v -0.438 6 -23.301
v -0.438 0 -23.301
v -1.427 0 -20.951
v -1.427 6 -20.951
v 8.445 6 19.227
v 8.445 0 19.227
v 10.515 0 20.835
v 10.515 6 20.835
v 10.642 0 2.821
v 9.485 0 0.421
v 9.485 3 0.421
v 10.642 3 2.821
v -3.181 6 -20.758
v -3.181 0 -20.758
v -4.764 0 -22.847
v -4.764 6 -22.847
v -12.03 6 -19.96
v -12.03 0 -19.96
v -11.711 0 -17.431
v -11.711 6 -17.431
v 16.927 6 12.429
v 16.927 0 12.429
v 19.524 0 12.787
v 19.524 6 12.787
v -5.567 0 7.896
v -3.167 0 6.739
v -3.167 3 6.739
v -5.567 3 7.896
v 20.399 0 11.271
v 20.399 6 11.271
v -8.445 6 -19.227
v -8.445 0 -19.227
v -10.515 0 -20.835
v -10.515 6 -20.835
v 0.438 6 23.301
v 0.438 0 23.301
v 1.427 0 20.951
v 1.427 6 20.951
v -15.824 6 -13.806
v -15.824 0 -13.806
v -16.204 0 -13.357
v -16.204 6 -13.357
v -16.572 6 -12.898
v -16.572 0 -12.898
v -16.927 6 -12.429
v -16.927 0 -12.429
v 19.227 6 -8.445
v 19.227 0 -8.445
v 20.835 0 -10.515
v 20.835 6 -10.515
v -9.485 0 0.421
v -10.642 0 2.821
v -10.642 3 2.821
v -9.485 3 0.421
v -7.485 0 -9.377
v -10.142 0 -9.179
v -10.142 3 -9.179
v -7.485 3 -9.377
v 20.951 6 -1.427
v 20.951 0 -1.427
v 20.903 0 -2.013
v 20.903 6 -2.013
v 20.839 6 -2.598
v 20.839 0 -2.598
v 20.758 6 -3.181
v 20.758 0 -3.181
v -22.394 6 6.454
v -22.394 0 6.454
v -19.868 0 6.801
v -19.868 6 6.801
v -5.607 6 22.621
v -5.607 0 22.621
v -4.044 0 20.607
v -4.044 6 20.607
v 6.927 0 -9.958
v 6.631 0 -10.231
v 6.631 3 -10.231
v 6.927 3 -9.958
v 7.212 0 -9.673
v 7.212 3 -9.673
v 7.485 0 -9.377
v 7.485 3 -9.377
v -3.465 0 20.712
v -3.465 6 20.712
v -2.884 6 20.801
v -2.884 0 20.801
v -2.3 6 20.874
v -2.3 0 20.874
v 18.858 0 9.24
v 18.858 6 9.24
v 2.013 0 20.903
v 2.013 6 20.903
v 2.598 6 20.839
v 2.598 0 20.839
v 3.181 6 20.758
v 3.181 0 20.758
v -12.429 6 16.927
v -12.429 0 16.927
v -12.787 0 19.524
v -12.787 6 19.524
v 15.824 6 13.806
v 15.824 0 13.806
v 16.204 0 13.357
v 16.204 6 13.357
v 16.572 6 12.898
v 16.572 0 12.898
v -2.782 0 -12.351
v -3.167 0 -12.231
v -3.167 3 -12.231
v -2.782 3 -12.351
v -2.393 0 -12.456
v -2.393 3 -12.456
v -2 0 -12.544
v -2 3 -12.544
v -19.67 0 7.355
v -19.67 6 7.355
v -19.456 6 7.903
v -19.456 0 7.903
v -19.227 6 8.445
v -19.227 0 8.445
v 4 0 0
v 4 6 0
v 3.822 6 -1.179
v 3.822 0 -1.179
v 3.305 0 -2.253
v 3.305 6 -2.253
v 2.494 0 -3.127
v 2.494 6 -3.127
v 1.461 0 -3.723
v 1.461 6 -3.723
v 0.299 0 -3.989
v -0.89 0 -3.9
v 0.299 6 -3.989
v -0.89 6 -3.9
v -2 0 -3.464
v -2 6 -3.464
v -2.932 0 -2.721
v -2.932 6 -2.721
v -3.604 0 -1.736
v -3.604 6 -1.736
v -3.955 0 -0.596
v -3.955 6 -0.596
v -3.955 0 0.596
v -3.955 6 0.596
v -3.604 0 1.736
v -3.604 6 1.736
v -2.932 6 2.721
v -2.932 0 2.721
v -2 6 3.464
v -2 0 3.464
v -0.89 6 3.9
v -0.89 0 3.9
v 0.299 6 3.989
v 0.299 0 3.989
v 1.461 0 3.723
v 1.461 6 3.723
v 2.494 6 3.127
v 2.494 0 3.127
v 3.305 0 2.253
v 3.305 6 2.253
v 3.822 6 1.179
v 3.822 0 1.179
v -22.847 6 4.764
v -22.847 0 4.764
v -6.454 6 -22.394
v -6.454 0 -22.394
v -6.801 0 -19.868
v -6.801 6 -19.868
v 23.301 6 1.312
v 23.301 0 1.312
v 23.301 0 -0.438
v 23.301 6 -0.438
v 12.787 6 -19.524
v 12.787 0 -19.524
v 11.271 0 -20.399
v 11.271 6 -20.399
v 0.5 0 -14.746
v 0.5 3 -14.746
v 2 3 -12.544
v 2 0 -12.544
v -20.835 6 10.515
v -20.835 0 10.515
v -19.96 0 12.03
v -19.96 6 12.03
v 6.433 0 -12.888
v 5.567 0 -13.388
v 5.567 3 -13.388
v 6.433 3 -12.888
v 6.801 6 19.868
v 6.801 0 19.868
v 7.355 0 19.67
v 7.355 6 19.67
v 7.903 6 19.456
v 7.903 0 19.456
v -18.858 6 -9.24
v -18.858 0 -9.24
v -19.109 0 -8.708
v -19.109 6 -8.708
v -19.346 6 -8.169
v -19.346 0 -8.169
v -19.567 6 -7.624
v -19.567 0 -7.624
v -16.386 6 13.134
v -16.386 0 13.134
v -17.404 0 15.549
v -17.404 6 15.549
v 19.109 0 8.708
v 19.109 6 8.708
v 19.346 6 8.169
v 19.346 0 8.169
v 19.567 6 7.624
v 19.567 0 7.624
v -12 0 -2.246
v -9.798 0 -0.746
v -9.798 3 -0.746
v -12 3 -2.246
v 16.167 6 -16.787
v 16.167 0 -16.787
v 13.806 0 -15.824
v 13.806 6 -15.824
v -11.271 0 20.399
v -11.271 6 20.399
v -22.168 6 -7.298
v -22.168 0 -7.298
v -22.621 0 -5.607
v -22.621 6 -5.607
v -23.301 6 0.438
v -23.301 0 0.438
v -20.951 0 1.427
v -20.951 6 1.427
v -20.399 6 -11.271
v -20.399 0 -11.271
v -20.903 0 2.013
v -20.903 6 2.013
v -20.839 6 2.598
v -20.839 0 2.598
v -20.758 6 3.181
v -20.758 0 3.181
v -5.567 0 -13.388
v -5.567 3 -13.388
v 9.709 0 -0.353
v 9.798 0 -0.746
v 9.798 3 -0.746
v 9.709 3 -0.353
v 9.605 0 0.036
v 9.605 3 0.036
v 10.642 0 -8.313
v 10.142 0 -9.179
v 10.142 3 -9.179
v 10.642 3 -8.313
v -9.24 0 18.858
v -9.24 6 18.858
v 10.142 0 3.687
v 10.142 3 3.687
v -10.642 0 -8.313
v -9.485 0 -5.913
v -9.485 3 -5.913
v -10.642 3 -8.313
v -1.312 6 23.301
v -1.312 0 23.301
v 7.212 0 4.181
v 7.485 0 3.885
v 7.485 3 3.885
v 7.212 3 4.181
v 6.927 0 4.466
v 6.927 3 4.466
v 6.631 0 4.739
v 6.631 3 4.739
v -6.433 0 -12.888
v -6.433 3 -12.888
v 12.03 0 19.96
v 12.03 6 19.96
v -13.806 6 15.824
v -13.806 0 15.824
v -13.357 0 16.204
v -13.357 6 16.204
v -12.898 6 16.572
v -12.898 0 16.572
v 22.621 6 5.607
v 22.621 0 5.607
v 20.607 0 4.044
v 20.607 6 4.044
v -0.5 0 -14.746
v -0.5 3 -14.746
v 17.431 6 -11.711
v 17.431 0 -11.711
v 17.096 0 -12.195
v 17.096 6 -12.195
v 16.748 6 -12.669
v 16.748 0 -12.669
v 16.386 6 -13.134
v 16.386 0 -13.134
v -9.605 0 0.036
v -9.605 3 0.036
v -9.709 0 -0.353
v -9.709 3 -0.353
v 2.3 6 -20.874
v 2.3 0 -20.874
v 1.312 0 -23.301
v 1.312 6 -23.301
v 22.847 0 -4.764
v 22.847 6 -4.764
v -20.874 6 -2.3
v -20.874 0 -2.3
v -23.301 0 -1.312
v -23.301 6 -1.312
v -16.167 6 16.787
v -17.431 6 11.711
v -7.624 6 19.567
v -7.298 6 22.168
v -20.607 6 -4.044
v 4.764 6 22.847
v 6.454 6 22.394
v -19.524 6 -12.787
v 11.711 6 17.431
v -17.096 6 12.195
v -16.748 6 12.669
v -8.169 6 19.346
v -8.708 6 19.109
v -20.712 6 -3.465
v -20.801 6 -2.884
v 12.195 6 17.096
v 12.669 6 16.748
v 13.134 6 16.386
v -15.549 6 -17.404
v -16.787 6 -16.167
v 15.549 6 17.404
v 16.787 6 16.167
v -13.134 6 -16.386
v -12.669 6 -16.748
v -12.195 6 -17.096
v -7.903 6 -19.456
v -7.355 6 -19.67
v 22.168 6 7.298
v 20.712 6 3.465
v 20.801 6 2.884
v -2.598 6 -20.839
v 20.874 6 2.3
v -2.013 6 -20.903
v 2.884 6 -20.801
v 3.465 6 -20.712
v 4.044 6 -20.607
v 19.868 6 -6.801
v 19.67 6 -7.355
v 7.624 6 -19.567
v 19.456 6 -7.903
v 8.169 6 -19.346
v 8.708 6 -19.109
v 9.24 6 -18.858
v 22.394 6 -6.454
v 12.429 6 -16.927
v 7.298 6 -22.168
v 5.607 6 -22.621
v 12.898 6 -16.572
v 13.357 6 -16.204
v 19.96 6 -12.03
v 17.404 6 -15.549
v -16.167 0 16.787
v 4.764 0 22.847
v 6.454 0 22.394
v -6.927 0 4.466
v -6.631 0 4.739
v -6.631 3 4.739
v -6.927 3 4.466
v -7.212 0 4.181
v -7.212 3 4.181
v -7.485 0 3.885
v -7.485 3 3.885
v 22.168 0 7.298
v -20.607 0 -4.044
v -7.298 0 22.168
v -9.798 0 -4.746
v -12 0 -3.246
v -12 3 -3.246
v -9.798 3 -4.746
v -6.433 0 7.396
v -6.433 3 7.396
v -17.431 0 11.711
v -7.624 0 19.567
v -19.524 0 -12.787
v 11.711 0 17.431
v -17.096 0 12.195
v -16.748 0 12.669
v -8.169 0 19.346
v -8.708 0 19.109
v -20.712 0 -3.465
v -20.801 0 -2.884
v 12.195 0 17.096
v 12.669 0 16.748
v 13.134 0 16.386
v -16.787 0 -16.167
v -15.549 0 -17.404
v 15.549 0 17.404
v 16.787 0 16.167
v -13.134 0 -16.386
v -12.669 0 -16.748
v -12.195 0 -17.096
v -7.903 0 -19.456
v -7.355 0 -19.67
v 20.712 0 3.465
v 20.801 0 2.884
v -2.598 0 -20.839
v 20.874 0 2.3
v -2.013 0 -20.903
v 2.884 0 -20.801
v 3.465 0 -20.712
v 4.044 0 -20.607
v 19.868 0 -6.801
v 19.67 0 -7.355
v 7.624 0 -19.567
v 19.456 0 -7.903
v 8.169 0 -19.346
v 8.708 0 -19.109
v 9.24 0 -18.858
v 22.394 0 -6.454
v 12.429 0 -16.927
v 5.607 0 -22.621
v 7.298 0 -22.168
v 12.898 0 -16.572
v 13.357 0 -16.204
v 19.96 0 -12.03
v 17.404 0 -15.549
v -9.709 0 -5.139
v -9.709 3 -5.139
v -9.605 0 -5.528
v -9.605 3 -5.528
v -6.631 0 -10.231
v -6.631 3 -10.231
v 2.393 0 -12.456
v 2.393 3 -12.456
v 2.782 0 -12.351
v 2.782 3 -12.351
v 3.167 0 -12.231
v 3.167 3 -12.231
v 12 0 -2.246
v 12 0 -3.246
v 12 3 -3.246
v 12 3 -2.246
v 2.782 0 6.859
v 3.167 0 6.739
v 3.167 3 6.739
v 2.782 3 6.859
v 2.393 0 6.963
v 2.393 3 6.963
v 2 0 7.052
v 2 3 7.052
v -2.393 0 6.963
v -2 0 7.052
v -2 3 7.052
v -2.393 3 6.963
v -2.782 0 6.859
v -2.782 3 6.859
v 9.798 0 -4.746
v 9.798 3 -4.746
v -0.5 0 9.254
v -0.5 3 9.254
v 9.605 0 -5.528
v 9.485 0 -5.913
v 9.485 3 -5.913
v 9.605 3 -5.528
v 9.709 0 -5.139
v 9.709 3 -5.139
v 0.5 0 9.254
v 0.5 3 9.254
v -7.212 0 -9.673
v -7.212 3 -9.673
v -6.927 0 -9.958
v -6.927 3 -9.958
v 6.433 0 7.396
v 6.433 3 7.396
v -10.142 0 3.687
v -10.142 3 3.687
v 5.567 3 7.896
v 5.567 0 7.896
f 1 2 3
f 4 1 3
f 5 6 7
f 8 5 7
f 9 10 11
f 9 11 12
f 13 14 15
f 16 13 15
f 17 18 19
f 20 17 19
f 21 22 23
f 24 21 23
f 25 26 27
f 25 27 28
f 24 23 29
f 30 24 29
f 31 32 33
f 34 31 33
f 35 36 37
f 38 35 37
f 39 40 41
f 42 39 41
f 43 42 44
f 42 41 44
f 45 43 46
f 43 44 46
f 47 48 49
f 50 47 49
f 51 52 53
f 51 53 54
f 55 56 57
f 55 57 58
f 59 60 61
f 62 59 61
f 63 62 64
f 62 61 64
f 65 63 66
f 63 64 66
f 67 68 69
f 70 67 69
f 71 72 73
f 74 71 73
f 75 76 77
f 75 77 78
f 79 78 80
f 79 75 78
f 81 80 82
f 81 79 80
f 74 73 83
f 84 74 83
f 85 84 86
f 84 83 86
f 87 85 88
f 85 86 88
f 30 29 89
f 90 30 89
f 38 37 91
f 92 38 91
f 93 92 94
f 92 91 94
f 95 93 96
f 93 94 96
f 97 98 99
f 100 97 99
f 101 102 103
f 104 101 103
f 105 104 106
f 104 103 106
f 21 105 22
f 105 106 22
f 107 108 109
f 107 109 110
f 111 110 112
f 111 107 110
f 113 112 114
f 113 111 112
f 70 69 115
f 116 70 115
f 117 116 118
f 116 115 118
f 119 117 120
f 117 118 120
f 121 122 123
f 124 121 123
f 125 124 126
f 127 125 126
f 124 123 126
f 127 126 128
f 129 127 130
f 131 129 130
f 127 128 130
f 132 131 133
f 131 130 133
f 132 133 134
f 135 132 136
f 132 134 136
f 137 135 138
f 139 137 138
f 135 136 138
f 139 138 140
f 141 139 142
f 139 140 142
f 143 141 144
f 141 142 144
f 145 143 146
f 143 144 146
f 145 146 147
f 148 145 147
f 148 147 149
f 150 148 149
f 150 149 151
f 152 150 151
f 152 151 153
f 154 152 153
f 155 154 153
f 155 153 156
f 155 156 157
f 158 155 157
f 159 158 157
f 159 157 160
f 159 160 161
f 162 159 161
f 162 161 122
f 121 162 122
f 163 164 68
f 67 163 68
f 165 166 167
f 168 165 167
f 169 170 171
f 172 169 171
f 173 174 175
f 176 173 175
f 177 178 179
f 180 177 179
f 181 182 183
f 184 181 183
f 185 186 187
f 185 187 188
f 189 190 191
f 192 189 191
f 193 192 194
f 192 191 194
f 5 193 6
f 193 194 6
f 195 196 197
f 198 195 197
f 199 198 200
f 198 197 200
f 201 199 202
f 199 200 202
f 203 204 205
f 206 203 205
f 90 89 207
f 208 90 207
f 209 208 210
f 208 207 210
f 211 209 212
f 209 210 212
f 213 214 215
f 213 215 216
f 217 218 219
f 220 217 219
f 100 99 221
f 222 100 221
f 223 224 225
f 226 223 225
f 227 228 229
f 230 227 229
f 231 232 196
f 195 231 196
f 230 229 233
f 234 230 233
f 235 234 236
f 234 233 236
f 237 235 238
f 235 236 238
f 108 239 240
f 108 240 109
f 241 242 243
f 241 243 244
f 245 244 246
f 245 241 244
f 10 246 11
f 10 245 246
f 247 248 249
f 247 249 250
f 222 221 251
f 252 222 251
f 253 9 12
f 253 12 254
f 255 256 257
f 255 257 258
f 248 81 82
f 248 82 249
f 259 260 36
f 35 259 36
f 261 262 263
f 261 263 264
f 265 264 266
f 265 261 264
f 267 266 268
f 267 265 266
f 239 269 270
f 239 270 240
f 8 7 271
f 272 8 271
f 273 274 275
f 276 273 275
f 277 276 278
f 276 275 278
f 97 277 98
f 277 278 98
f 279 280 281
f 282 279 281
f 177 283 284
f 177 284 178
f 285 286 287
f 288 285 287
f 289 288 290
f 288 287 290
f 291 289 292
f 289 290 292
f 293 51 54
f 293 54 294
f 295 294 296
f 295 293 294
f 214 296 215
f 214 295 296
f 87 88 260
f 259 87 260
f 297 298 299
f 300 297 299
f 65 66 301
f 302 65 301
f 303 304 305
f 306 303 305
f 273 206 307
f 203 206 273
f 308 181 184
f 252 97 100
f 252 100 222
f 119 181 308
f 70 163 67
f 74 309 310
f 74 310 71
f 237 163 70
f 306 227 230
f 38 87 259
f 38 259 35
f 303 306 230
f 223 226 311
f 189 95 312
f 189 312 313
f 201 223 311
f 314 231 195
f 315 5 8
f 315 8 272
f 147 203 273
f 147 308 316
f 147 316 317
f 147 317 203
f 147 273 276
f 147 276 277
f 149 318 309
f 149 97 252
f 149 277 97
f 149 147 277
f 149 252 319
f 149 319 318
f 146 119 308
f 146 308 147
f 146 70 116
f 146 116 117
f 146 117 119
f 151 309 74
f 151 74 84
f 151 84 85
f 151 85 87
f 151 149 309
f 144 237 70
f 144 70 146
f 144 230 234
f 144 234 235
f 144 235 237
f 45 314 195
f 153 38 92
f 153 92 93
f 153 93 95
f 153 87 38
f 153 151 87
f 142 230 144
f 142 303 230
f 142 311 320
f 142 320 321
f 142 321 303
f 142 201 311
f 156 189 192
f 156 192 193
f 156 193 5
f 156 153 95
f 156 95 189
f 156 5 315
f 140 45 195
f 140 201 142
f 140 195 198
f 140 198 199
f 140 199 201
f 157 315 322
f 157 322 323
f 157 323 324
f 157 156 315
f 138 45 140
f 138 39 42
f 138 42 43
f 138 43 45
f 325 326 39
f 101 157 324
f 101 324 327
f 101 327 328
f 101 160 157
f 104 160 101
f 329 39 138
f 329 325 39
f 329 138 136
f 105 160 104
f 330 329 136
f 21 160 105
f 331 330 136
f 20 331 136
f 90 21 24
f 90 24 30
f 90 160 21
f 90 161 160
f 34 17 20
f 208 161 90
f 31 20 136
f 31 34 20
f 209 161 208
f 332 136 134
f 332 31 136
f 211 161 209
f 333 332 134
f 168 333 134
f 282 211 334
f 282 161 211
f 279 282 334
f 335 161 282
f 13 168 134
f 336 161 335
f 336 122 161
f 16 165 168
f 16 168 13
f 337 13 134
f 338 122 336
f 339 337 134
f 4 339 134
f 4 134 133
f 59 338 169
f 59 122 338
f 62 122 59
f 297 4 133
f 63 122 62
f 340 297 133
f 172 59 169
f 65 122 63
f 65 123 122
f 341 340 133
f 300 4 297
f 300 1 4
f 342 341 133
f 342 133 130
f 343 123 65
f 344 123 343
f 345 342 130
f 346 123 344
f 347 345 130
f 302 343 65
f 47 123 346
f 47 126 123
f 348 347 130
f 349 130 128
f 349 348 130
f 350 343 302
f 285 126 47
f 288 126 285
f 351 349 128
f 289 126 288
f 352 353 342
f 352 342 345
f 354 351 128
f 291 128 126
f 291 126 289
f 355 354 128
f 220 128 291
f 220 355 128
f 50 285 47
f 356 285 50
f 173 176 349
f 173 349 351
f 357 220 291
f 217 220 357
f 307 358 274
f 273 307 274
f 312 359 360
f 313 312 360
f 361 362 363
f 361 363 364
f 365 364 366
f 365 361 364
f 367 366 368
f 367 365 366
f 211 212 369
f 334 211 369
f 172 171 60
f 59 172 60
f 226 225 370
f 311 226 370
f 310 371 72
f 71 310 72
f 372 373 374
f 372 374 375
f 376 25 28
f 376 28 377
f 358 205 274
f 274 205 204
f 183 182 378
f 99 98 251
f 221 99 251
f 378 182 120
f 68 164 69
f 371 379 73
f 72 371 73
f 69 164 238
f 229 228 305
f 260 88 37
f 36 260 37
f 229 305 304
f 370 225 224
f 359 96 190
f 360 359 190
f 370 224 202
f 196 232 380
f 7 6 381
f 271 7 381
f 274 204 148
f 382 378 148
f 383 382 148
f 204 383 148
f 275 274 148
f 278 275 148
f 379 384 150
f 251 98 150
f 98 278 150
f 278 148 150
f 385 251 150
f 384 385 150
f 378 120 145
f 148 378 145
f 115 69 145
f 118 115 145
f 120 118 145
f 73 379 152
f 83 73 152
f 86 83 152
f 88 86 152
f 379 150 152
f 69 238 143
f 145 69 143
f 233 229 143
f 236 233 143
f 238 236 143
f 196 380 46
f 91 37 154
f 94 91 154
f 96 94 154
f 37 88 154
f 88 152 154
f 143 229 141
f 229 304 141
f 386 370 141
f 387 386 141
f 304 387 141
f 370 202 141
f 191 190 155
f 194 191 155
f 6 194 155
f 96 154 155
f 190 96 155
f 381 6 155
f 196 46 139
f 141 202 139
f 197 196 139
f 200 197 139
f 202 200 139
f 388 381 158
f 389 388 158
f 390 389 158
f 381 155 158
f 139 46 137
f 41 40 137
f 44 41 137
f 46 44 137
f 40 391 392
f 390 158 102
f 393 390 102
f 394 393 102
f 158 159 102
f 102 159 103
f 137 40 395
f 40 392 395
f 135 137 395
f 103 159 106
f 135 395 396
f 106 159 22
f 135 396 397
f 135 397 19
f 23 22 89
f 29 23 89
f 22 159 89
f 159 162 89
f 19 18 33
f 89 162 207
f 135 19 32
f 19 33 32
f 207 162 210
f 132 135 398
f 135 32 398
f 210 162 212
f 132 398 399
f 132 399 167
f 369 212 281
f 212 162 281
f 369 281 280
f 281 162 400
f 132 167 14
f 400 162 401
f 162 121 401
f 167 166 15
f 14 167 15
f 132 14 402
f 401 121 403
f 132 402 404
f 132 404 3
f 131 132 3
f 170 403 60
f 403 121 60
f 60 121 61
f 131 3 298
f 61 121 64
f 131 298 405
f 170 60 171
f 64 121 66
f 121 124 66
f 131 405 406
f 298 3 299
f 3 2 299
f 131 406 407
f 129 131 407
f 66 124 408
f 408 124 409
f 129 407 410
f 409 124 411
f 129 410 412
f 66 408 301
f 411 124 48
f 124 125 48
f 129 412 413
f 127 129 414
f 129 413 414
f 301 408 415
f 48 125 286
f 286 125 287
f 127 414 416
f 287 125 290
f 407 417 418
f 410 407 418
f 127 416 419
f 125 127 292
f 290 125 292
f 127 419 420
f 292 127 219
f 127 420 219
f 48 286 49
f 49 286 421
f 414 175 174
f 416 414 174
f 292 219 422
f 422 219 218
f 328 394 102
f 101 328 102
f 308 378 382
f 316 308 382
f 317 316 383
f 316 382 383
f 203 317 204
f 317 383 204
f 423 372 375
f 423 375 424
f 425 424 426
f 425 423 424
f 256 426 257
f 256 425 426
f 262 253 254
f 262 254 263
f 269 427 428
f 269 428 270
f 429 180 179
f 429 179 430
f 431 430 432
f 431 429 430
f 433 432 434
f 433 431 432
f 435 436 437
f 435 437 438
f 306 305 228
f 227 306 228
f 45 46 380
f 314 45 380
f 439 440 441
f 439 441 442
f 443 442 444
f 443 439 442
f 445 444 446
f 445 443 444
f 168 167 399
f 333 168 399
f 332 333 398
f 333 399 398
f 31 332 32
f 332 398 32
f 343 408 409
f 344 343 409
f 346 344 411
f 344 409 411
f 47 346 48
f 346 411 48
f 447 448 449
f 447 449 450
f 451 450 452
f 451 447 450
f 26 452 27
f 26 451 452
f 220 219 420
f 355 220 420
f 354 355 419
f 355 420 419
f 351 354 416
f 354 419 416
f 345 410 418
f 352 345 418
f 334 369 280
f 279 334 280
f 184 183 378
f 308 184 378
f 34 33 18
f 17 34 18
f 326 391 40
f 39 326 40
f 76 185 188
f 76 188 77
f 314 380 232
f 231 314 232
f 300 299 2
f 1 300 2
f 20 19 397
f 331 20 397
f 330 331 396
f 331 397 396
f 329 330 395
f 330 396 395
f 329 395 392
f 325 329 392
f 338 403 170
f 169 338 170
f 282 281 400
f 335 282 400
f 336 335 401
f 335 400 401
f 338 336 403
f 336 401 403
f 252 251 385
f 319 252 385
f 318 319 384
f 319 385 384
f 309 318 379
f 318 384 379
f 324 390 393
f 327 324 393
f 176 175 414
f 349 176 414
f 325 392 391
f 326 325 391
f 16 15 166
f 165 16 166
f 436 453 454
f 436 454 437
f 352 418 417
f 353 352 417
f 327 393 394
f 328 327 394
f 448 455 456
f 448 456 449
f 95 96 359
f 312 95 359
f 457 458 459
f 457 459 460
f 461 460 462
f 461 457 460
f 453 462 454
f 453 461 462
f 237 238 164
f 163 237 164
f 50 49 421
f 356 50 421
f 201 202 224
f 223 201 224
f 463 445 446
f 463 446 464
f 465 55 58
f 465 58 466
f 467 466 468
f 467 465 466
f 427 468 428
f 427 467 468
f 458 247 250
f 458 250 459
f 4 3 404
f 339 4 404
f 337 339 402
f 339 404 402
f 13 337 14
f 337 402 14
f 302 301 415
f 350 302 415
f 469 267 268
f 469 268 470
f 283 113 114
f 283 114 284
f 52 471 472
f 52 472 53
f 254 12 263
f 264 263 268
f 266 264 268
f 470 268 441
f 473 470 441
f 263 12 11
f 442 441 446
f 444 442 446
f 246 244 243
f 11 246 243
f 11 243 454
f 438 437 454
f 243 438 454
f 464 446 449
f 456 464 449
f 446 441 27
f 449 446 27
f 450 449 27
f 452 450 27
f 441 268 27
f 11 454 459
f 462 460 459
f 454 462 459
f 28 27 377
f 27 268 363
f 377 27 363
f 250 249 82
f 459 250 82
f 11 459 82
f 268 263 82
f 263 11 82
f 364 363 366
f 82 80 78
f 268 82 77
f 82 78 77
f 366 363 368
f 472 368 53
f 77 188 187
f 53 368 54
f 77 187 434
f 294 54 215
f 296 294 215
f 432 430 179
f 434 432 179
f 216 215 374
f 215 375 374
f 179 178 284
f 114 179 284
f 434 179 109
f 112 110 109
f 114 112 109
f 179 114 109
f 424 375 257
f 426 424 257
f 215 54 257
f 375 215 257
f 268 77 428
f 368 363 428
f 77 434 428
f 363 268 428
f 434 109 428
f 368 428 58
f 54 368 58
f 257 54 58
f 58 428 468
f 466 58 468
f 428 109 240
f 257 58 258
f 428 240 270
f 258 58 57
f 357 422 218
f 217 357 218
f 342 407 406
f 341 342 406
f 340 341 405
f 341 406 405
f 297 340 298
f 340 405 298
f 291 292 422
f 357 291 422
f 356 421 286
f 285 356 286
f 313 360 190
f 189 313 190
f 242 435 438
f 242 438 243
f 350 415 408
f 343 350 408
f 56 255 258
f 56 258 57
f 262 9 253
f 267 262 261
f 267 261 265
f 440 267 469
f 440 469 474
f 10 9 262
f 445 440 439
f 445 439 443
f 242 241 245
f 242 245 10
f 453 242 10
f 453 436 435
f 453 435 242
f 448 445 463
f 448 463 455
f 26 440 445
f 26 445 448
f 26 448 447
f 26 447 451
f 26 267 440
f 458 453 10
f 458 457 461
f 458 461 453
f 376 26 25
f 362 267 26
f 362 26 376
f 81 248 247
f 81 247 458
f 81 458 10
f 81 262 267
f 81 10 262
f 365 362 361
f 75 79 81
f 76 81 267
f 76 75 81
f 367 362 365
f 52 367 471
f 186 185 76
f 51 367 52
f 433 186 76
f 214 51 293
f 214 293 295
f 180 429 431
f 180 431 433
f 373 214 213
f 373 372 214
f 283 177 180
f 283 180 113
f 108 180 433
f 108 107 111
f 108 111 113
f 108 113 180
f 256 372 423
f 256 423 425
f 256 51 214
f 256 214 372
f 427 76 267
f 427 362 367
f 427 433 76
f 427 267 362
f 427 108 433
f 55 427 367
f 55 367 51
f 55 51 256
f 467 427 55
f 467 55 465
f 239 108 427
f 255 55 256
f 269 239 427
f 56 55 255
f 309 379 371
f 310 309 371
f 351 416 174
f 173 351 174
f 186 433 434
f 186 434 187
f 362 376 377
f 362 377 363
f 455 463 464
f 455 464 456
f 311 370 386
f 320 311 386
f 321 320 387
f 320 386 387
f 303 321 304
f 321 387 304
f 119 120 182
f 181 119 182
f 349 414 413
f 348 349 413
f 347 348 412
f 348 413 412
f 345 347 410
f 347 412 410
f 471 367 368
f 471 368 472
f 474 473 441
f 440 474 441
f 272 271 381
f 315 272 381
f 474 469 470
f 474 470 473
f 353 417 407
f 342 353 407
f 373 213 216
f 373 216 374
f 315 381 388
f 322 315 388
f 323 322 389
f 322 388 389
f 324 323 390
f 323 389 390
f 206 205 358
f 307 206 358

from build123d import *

# Parameters (mm, degrees)
BOSS_EXTRUDE5_DEPTH = 6
BOSS_EXTRUDE6_DEPTH = 3
SKETCH4_R           = 4
CUT_EXTRUDE1_DEPTH  = 10


with BuildPart() as part:
    # Sketch3 → Boss-Extrude5 (new body)
    with BuildSketch(Plane(origin=(0, 0, 0), x_dir=(1, 0, 0), z_dir=(0, 1, 0))):
        with BuildLine():
            Line((23.301465589, -1.311541929), (23.301465589, 0.438458071))
            Line((23.301465589, 0.438458071), (20.951465589, 1.426916143))
            ThreePointArc((20.951465589, 1.426916143), (20.873013262, 2.30593091), (20.757698449, 3.180873321))
            Line((20.757698449, 3.180873321), (22.846939432, 4.764010852))
            Line((22.846939432, 4.764010852), (22.394006103, 6.454381048))
            Line((22.394006103, 6.454381048), (19.868248637, 6.800933471))
            ThreePointArc((19.868248637, 6.800933471), (19.564963746, 7.629691581), (19.227126431, 8.444975382))
            Line((19.227126431, 8.444975382), (20.83543211, 10.514904166))
            Line((20.83543211, 10.514904166), (19.96043211, 12.030448623))
            Line((19.96043211, 12.030448623), (17.431043375, 11.711478423))
            ThreePointArc((17.431043375, 11.711478423), (16.923594283, 12.433501379), (16.386257521, 13.133566327))
            Line((16.386257521, 13.133566327), (17.404024521, 15.549224138))
            Line((17.404024521, 15.549224138), (16.166587654, 16.786661005))
            Line((16.166587654, 16.786661005), (13.805941313, 15.823905474))
            ThreePointArc((13.805941313, 15.823905474), (13.128909838, 16.389988605), (12.42869224, 16.927126431))
            Line((12.42869224, 16.927126431), (12.786561423, 19.523890181))
            Line((12.786561423, 19.523890181), (11.271016966, 20.398890181))
            Line((11.271016966, 20.398890181), (9.239987166, 18.857959518))
            ThreePointArc((9.239987166, 18.857959518), (8.439511883, 19.229525194), (7.624132122, 19.567130842))
            Line((7.624132122, 19.567130842), (7.297715294, 22.168035373))
            Line((7.297715294, 22.168035373), (5.607345098, 22.620968702))
            Line((5.607345098, 22.620968702), (4.044343163, 20.606874784))
            ThreePointArc((4.044343163, 20.606874784), (3.174975141, 20.758601419), (2.3, 20.873667622))
            Line((2.3, 20.873667622), (1.311541929, 23.301465589))
            Line((1.311541929, 23.301465589), (-0.438458071, 23.301465589))
            Line((-0.438458071, 23.301465589), (-1.426916143, 20.951465589))
            ThreePointArc((-1.426916143, 20.951465589), (-2.30593091, 20.873013262), (-3.180873321, 20.757698449))
            Line((-3.180873321, 20.757698449), (-4.764010852, 22.846939432))
            Line((-4.764010852, 22.846939432), (-6.454381048, 22.394006103))
            Line((-6.454381048, 22.394006103), (-6.800933471, 19.868248637))
            ThreePointArc((-6.800933471, 19.868248637), (-7.629691581, 19.564963746), (-8.444975382, 19.227126431))
            Line((-8.444975382, 19.227126431), (-10.514904166, 20.83543211))
            Line((-10.514904166, 20.83543211), (-12.030448623, 19.96043211))
            Line((-12.030448623, 19.96043211), (-11.711478423, 17.431043375))
            ThreePointArc((-11.711478423, 17.431043375), (-12.433501379, 16.923594283), (-13.133566327, 16.386257521))
            Line((-13.133566327, 16.386257521), (-15.549224138, 17.404024521))
            Line((-15.549224138, 17.404024521), (-16.786661005, 16.166587654))
            Line((-16.786661005, 16.166587654), (-15.823905474, 13.805941313))
            ThreePointArc((-15.823905474, 13.805941313), (-16.389988605, 13.128909838), (-16.927126431, 12.42869224))
            Line((-16.927126431, 12.42869224), (-19.523890181, 12.786561423))
            Line((-19.523890181, 12.786561423), (-20.398890181, 11.271016966))
            Line((-20.398890181, 11.271016966), (-18.857959518, 9.239987166))
            ThreePointArc((-18.857959518, 9.239987166), (-19.229525194, 8.439511883), (-19.567130842, 7.624132122))
            Line((-19.567130842, 7.624132122), (-22.168035373, 7.297715294))
            Line((-22.168035373, 7.297715294), (-22.620968702, 5.607345098))
            Line((-22.620968702, 5.607345098), (-20.606874784, 4.044343163))
            ThreePointArc((-20.606874784, 4.044343163), (-20.758601419, 3.174975141), (-20.873667622, 2.3))
            Line((-20.873667622, 2.3), (-23.301465589, 1.311541929))
            Line((-23.301465589, 1.311541929), (-23.301465589, -0.438458071))
            Line((-23.301465589, -0.438458071), (-20.951465589, -1.426916143))
            ThreePointArc((-20.951465589, -1.426916143), (-20.873013262, -2.30593091), (-20.757698449, -3.180873321))
            Line((-20.757698449, -3.180873321), (-22.846939432, -4.764010852))
            Line((-22.846939432, -4.764010852), (-22.394006103, -6.454381048))
            Line((-22.394006103, -6.454381048), (-19.868248637, -6.800933471))
            ThreePointArc((-19.868248637, -6.800933471), (-19.564963746, -7.629691581), (-19.227126431, -8.444975382))
            Line((-19.227126431, -8.444975382), (-20.83543211, -10.514904166))
            Line((-20.83543211, -10.514904166), (-19.96043211, -12.030448623))
            Line((-19.96043211, -12.030448623), (-17.431043375, -11.711478423))
            ThreePointArc((-17.431043375, -11.711478423), (-16.923594283, -12.433501379), (-16.386257521, -13.133566327))
            Line((-16.386257521, -13.133566327), (-17.404024521, -15.549224138))
            Line((-17.404024521, -15.549224138), (-16.166587654, -16.786661005))
            Line((-16.166587654, -16.786661005), (-13.805941313, -15.823905474))
            ThreePointArc((-13.805941313, -15.823905474), (-13.128909838, -16.389988605), (-12.42869224, -16.927126431))
            Line((-12.42869224, -16.927126431), (-12.786561423, -19.523890181))
            Line((-12.786561423, -19.523890181), (-11.271016966, -20.398890181))
            Line((-11.271016966, -20.398890181), (-9.239987166, -18.857959518))
            ThreePointArc((-9.239987166, -18.857959518), (-8.439511883, -19.229525194), (-7.624132122, -19.567130842))
            Line((-7.624132122, -19.567130842), (-7.297715294, -22.168035373))
            Line((-7.297715294, -22.168035373), (-5.607345098, -22.620968702))
            Line((-5.607345098, -22.620968702), (-4.044343163, -20.606874784))
            ThreePointArc((-4.044343163, -20.606874784), (-3.174975141, -20.758601419), (-2.3, -20.873667622))
            Line((-2.3, -20.873667622), (-1.311541929, -23.301465589))
            Line((-1.311541929, -23.301465589), (0.438458071, -23.301465589))
            Line((0.438458071, -23.301465589), (1.426916143, -20.951465589))
            ThreePointArc((1.426916143, -20.951465589), (2.30593091, -20.873013262), (3.180873321, -20.757698449))
            Line((3.180873321, -20.757698449), (4.764010852, -22.846939432))
            Line((4.764010852, -22.846939432), (6.454381048, -22.394006103))
            Line((6.454381048, -22.394006103), (6.800933471, -19.868248637))
            ThreePointArc((6.800933471, -19.868248637), (7.629691581, -19.564963746), (8.444975382, -19.227126431))
            Line((8.444975382, -19.227126431), (10.514904166, -20.83543211))
            Line((10.514904166, -20.83543211), (12.030448623, -19.96043211))
            Line((12.030448623, -19.96043211), (11.711478423, -17.431043375))
            ThreePointArc((11.711478423, -17.431043375), (12.433501379, -16.923594283), (13.133566327, -16.386257521))
            Line((13.133566327, -16.386257521), (15.549224138, -17.404024521))
            Line((15.549224138, -17.404024521), (16.786661005, -16.166587654))
            Line((16.786661005, -16.166587654), (15.823905474, -13.805941313))
            ThreePointArc((15.823905474, -13.805941313), (16.389988605, -13.128909838), (16.927126431, -12.42869224))
            Line((16.927126431, -12.42869224), (19.523890181, -12.786561423))
            Line((19.523890181, -12.786561423), (20.398890181, -11.271016966))
            Line((20.398890181, -11.271016966), (18.857959518, -9.239987166))
            ThreePointArc((18.857959518, -9.239987166), (19.229525194, -8.439511883), (19.567130842, -7.624132122))
            Line((19.567130842, -7.624132122), (22.168035373, -7.297715294))
            Line((22.168035373, -7.297715294), (22.620968702, -5.607345098))
            Line((22.620968702, -5.607345098), (20.606874784, -4.044343163))
            ThreePointArc((20.606874784, -4.044343163), (20.758601419, -3.174975141), (20.873667622, -2.3))
            Line((20.873667622, -2.3), (23.301465589, -1.311541929))
        make_face()
    extrude(amount=BOSS_EXTRUDE5_DEPTH)

    # Sketch4 → Cut-Extrude1 (cut)
    with BuildSketch(Plane(origin=(0, 6, 0), x_dir=(1, 0, 0), z_dir=(0, 1, 0))):
        Circle(SKETCH4_R)
    extrude(amount=-CUT_EXTRUDE1_DEPTH, mode=Mode.SUBTRACT)


with BuildPart() as body_2:
    # Sketch1 → Boss-Extrude6 (new body)
    with BuildSketch(Plane(origin=(0, 0, 0), x_dir=(1, 0, 0), z_dir=(0, 1, 0))):
        with BuildLine():
            Line((-0.5, 14.746169466), (0.5, 14.746169466))
            Line((0.5, 14.746169466), (2, 12.544128437))
            ThreePointArc((2, 12.544128437), (2.588190451, 12.405427729), (3.166928678, 12.23145084))
            Line((3.166928678, 12.23145084), (5.566987298, 13.388474311))
            Line((5.566987298, 13.388474311), (6.433012702, 12.888474311))
            Line((6.433012702, 12.888474311), (6.631030293, 10.23145084))
            ThreePointArc((6.631030293, 10.23145084), (7.071067812, 9.817237278), (7.485281374, 9.377199759))
            Line((7.485281374, 9.377199759), (10.142304845, 9.179182168))
            Line((10.142304845, 9.179182168), (10.642304845, 8.313156764))
            Line((10.642304845, 8.313156764), (9.485281374, 5.913098144))
            ThreePointArc((9.485281374, 5.913098144), (9.659258263, 5.334359917), (9.797958971, 4.746169466))
            Line((9.797958971, 4.746169466), (12, 3.246169466))
            Line((12, 3.246169466), (12, 2.246169466))
            Line((12, 2.246169466), (9.797958971, 0.746169466))
            ThreePointArc((9.797958971, 0.746169466), (9.659258263, 0.157979015), (9.485281374, -0.420759212))
            Line((9.485281374, -0.420759212), (10.642304845, -2.820817832))
            Line((10.642304845, -2.820817832), (10.142304845, -3.686843236))
            Line((10.142304845, -3.686843236), (7.485281374, -3.884860827))
            ThreePointArc((7.485281374, -3.884860827), (7.071067812, -4.324898346), (6.631030293, -4.739111908))
            Line((6.631030293, -4.739111908), (6.433012702, -7.39613538))
            Line((6.433012702, -7.39613538), (5.566987298, -7.89613538))
            Line((5.566987298, -7.89613538), (3.166928678, -6.739111908))
            ThreePointArc((3.166928678, -6.739111908), (2.588190451, -6.913088797), (2, -7.051789505))
            Line((2, -7.051789505), (0.5, -9.253830534))
            Line((0.5, -9.253830534), (-0.5, -9.253830534))
            Line((-0.5, -9.253830534), (-2, -7.051789505))
            ThreePointArc((-2, -7.051789505), (-2.588190451, -6.913088797), (-3.166928678, -6.739111908))
            Line((-3.166928678, -6.739111908), (-5.566987298, -7.89613538))
            Line((-5.566987298, -7.89613538), (-6.433012702, -7.39613538))
            Line((-6.433012702, -7.39613538), (-6.631030293, -4.739111908))
            ThreePointArc((-6.631030293, -4.739111908), (-7.071067812, -4.324898346), (-7.485281374, -3.884860827))
            Line((-7.485281374, -3.884860827), (-10.142304845, -3.686843236))
            Line((-10.142304845, -3.686843236), (-10.642304845, -2.820817832))
            Line((-10.642304845, -2.820817832), (-9.485281374, -0.420759212))
            ThreePointArc((-9.485281374, -0.420759212), (-9.659258263, 0.157979015), (-9.797958971, 0.746169466))
            Line((-9.797958971, 0.746169466), (-12, 2.246169466))
            Line((-12, 2.246169466), (-12, 3.246169466))
            Line((-12, 3.246169466), (-9.797958971, 4.746169466))
            ThreePointArc((-9.797958971, 4.746169466), (-9.659258263, 5.334359917), (-9.485281374, 5.913098144))
            Line((-9.485281374, 5.913098144), (-10.642304845, 8.313156764))
            Line((-10.642304845, 8.313156764), (-10.142304845, 9.179182168))
            Line((-10.142304845, 9.179182168), (-7.485281374, 9.377199759))
            ThreePointArc((-7.485281374, 9.377199759), (-7.071067812, 9.817237278), (-6.631030293, 10.23145084))
            Line((-6.631030293, 10.23145084), (-6.433012702, 12.888474311))
            Line((-6.433012702, 12.888474311), (-5.566987298, 13.388474311))
            Line((-5.566987298, 13.388474311), (-3.166928678, 12.23145084))
            ThreePointArc((-3.166928678, 12.23145084), (-2.588190451, 12.405427729), (-2, 12.544128437))
            Line((-2, 12.544128437), (-0.5, 14.746169466))
        make_face()
    extrude(amount=BOSS_EXTRUDE6_DEPTH)


solid = Compound([part.part, body_2.part])
